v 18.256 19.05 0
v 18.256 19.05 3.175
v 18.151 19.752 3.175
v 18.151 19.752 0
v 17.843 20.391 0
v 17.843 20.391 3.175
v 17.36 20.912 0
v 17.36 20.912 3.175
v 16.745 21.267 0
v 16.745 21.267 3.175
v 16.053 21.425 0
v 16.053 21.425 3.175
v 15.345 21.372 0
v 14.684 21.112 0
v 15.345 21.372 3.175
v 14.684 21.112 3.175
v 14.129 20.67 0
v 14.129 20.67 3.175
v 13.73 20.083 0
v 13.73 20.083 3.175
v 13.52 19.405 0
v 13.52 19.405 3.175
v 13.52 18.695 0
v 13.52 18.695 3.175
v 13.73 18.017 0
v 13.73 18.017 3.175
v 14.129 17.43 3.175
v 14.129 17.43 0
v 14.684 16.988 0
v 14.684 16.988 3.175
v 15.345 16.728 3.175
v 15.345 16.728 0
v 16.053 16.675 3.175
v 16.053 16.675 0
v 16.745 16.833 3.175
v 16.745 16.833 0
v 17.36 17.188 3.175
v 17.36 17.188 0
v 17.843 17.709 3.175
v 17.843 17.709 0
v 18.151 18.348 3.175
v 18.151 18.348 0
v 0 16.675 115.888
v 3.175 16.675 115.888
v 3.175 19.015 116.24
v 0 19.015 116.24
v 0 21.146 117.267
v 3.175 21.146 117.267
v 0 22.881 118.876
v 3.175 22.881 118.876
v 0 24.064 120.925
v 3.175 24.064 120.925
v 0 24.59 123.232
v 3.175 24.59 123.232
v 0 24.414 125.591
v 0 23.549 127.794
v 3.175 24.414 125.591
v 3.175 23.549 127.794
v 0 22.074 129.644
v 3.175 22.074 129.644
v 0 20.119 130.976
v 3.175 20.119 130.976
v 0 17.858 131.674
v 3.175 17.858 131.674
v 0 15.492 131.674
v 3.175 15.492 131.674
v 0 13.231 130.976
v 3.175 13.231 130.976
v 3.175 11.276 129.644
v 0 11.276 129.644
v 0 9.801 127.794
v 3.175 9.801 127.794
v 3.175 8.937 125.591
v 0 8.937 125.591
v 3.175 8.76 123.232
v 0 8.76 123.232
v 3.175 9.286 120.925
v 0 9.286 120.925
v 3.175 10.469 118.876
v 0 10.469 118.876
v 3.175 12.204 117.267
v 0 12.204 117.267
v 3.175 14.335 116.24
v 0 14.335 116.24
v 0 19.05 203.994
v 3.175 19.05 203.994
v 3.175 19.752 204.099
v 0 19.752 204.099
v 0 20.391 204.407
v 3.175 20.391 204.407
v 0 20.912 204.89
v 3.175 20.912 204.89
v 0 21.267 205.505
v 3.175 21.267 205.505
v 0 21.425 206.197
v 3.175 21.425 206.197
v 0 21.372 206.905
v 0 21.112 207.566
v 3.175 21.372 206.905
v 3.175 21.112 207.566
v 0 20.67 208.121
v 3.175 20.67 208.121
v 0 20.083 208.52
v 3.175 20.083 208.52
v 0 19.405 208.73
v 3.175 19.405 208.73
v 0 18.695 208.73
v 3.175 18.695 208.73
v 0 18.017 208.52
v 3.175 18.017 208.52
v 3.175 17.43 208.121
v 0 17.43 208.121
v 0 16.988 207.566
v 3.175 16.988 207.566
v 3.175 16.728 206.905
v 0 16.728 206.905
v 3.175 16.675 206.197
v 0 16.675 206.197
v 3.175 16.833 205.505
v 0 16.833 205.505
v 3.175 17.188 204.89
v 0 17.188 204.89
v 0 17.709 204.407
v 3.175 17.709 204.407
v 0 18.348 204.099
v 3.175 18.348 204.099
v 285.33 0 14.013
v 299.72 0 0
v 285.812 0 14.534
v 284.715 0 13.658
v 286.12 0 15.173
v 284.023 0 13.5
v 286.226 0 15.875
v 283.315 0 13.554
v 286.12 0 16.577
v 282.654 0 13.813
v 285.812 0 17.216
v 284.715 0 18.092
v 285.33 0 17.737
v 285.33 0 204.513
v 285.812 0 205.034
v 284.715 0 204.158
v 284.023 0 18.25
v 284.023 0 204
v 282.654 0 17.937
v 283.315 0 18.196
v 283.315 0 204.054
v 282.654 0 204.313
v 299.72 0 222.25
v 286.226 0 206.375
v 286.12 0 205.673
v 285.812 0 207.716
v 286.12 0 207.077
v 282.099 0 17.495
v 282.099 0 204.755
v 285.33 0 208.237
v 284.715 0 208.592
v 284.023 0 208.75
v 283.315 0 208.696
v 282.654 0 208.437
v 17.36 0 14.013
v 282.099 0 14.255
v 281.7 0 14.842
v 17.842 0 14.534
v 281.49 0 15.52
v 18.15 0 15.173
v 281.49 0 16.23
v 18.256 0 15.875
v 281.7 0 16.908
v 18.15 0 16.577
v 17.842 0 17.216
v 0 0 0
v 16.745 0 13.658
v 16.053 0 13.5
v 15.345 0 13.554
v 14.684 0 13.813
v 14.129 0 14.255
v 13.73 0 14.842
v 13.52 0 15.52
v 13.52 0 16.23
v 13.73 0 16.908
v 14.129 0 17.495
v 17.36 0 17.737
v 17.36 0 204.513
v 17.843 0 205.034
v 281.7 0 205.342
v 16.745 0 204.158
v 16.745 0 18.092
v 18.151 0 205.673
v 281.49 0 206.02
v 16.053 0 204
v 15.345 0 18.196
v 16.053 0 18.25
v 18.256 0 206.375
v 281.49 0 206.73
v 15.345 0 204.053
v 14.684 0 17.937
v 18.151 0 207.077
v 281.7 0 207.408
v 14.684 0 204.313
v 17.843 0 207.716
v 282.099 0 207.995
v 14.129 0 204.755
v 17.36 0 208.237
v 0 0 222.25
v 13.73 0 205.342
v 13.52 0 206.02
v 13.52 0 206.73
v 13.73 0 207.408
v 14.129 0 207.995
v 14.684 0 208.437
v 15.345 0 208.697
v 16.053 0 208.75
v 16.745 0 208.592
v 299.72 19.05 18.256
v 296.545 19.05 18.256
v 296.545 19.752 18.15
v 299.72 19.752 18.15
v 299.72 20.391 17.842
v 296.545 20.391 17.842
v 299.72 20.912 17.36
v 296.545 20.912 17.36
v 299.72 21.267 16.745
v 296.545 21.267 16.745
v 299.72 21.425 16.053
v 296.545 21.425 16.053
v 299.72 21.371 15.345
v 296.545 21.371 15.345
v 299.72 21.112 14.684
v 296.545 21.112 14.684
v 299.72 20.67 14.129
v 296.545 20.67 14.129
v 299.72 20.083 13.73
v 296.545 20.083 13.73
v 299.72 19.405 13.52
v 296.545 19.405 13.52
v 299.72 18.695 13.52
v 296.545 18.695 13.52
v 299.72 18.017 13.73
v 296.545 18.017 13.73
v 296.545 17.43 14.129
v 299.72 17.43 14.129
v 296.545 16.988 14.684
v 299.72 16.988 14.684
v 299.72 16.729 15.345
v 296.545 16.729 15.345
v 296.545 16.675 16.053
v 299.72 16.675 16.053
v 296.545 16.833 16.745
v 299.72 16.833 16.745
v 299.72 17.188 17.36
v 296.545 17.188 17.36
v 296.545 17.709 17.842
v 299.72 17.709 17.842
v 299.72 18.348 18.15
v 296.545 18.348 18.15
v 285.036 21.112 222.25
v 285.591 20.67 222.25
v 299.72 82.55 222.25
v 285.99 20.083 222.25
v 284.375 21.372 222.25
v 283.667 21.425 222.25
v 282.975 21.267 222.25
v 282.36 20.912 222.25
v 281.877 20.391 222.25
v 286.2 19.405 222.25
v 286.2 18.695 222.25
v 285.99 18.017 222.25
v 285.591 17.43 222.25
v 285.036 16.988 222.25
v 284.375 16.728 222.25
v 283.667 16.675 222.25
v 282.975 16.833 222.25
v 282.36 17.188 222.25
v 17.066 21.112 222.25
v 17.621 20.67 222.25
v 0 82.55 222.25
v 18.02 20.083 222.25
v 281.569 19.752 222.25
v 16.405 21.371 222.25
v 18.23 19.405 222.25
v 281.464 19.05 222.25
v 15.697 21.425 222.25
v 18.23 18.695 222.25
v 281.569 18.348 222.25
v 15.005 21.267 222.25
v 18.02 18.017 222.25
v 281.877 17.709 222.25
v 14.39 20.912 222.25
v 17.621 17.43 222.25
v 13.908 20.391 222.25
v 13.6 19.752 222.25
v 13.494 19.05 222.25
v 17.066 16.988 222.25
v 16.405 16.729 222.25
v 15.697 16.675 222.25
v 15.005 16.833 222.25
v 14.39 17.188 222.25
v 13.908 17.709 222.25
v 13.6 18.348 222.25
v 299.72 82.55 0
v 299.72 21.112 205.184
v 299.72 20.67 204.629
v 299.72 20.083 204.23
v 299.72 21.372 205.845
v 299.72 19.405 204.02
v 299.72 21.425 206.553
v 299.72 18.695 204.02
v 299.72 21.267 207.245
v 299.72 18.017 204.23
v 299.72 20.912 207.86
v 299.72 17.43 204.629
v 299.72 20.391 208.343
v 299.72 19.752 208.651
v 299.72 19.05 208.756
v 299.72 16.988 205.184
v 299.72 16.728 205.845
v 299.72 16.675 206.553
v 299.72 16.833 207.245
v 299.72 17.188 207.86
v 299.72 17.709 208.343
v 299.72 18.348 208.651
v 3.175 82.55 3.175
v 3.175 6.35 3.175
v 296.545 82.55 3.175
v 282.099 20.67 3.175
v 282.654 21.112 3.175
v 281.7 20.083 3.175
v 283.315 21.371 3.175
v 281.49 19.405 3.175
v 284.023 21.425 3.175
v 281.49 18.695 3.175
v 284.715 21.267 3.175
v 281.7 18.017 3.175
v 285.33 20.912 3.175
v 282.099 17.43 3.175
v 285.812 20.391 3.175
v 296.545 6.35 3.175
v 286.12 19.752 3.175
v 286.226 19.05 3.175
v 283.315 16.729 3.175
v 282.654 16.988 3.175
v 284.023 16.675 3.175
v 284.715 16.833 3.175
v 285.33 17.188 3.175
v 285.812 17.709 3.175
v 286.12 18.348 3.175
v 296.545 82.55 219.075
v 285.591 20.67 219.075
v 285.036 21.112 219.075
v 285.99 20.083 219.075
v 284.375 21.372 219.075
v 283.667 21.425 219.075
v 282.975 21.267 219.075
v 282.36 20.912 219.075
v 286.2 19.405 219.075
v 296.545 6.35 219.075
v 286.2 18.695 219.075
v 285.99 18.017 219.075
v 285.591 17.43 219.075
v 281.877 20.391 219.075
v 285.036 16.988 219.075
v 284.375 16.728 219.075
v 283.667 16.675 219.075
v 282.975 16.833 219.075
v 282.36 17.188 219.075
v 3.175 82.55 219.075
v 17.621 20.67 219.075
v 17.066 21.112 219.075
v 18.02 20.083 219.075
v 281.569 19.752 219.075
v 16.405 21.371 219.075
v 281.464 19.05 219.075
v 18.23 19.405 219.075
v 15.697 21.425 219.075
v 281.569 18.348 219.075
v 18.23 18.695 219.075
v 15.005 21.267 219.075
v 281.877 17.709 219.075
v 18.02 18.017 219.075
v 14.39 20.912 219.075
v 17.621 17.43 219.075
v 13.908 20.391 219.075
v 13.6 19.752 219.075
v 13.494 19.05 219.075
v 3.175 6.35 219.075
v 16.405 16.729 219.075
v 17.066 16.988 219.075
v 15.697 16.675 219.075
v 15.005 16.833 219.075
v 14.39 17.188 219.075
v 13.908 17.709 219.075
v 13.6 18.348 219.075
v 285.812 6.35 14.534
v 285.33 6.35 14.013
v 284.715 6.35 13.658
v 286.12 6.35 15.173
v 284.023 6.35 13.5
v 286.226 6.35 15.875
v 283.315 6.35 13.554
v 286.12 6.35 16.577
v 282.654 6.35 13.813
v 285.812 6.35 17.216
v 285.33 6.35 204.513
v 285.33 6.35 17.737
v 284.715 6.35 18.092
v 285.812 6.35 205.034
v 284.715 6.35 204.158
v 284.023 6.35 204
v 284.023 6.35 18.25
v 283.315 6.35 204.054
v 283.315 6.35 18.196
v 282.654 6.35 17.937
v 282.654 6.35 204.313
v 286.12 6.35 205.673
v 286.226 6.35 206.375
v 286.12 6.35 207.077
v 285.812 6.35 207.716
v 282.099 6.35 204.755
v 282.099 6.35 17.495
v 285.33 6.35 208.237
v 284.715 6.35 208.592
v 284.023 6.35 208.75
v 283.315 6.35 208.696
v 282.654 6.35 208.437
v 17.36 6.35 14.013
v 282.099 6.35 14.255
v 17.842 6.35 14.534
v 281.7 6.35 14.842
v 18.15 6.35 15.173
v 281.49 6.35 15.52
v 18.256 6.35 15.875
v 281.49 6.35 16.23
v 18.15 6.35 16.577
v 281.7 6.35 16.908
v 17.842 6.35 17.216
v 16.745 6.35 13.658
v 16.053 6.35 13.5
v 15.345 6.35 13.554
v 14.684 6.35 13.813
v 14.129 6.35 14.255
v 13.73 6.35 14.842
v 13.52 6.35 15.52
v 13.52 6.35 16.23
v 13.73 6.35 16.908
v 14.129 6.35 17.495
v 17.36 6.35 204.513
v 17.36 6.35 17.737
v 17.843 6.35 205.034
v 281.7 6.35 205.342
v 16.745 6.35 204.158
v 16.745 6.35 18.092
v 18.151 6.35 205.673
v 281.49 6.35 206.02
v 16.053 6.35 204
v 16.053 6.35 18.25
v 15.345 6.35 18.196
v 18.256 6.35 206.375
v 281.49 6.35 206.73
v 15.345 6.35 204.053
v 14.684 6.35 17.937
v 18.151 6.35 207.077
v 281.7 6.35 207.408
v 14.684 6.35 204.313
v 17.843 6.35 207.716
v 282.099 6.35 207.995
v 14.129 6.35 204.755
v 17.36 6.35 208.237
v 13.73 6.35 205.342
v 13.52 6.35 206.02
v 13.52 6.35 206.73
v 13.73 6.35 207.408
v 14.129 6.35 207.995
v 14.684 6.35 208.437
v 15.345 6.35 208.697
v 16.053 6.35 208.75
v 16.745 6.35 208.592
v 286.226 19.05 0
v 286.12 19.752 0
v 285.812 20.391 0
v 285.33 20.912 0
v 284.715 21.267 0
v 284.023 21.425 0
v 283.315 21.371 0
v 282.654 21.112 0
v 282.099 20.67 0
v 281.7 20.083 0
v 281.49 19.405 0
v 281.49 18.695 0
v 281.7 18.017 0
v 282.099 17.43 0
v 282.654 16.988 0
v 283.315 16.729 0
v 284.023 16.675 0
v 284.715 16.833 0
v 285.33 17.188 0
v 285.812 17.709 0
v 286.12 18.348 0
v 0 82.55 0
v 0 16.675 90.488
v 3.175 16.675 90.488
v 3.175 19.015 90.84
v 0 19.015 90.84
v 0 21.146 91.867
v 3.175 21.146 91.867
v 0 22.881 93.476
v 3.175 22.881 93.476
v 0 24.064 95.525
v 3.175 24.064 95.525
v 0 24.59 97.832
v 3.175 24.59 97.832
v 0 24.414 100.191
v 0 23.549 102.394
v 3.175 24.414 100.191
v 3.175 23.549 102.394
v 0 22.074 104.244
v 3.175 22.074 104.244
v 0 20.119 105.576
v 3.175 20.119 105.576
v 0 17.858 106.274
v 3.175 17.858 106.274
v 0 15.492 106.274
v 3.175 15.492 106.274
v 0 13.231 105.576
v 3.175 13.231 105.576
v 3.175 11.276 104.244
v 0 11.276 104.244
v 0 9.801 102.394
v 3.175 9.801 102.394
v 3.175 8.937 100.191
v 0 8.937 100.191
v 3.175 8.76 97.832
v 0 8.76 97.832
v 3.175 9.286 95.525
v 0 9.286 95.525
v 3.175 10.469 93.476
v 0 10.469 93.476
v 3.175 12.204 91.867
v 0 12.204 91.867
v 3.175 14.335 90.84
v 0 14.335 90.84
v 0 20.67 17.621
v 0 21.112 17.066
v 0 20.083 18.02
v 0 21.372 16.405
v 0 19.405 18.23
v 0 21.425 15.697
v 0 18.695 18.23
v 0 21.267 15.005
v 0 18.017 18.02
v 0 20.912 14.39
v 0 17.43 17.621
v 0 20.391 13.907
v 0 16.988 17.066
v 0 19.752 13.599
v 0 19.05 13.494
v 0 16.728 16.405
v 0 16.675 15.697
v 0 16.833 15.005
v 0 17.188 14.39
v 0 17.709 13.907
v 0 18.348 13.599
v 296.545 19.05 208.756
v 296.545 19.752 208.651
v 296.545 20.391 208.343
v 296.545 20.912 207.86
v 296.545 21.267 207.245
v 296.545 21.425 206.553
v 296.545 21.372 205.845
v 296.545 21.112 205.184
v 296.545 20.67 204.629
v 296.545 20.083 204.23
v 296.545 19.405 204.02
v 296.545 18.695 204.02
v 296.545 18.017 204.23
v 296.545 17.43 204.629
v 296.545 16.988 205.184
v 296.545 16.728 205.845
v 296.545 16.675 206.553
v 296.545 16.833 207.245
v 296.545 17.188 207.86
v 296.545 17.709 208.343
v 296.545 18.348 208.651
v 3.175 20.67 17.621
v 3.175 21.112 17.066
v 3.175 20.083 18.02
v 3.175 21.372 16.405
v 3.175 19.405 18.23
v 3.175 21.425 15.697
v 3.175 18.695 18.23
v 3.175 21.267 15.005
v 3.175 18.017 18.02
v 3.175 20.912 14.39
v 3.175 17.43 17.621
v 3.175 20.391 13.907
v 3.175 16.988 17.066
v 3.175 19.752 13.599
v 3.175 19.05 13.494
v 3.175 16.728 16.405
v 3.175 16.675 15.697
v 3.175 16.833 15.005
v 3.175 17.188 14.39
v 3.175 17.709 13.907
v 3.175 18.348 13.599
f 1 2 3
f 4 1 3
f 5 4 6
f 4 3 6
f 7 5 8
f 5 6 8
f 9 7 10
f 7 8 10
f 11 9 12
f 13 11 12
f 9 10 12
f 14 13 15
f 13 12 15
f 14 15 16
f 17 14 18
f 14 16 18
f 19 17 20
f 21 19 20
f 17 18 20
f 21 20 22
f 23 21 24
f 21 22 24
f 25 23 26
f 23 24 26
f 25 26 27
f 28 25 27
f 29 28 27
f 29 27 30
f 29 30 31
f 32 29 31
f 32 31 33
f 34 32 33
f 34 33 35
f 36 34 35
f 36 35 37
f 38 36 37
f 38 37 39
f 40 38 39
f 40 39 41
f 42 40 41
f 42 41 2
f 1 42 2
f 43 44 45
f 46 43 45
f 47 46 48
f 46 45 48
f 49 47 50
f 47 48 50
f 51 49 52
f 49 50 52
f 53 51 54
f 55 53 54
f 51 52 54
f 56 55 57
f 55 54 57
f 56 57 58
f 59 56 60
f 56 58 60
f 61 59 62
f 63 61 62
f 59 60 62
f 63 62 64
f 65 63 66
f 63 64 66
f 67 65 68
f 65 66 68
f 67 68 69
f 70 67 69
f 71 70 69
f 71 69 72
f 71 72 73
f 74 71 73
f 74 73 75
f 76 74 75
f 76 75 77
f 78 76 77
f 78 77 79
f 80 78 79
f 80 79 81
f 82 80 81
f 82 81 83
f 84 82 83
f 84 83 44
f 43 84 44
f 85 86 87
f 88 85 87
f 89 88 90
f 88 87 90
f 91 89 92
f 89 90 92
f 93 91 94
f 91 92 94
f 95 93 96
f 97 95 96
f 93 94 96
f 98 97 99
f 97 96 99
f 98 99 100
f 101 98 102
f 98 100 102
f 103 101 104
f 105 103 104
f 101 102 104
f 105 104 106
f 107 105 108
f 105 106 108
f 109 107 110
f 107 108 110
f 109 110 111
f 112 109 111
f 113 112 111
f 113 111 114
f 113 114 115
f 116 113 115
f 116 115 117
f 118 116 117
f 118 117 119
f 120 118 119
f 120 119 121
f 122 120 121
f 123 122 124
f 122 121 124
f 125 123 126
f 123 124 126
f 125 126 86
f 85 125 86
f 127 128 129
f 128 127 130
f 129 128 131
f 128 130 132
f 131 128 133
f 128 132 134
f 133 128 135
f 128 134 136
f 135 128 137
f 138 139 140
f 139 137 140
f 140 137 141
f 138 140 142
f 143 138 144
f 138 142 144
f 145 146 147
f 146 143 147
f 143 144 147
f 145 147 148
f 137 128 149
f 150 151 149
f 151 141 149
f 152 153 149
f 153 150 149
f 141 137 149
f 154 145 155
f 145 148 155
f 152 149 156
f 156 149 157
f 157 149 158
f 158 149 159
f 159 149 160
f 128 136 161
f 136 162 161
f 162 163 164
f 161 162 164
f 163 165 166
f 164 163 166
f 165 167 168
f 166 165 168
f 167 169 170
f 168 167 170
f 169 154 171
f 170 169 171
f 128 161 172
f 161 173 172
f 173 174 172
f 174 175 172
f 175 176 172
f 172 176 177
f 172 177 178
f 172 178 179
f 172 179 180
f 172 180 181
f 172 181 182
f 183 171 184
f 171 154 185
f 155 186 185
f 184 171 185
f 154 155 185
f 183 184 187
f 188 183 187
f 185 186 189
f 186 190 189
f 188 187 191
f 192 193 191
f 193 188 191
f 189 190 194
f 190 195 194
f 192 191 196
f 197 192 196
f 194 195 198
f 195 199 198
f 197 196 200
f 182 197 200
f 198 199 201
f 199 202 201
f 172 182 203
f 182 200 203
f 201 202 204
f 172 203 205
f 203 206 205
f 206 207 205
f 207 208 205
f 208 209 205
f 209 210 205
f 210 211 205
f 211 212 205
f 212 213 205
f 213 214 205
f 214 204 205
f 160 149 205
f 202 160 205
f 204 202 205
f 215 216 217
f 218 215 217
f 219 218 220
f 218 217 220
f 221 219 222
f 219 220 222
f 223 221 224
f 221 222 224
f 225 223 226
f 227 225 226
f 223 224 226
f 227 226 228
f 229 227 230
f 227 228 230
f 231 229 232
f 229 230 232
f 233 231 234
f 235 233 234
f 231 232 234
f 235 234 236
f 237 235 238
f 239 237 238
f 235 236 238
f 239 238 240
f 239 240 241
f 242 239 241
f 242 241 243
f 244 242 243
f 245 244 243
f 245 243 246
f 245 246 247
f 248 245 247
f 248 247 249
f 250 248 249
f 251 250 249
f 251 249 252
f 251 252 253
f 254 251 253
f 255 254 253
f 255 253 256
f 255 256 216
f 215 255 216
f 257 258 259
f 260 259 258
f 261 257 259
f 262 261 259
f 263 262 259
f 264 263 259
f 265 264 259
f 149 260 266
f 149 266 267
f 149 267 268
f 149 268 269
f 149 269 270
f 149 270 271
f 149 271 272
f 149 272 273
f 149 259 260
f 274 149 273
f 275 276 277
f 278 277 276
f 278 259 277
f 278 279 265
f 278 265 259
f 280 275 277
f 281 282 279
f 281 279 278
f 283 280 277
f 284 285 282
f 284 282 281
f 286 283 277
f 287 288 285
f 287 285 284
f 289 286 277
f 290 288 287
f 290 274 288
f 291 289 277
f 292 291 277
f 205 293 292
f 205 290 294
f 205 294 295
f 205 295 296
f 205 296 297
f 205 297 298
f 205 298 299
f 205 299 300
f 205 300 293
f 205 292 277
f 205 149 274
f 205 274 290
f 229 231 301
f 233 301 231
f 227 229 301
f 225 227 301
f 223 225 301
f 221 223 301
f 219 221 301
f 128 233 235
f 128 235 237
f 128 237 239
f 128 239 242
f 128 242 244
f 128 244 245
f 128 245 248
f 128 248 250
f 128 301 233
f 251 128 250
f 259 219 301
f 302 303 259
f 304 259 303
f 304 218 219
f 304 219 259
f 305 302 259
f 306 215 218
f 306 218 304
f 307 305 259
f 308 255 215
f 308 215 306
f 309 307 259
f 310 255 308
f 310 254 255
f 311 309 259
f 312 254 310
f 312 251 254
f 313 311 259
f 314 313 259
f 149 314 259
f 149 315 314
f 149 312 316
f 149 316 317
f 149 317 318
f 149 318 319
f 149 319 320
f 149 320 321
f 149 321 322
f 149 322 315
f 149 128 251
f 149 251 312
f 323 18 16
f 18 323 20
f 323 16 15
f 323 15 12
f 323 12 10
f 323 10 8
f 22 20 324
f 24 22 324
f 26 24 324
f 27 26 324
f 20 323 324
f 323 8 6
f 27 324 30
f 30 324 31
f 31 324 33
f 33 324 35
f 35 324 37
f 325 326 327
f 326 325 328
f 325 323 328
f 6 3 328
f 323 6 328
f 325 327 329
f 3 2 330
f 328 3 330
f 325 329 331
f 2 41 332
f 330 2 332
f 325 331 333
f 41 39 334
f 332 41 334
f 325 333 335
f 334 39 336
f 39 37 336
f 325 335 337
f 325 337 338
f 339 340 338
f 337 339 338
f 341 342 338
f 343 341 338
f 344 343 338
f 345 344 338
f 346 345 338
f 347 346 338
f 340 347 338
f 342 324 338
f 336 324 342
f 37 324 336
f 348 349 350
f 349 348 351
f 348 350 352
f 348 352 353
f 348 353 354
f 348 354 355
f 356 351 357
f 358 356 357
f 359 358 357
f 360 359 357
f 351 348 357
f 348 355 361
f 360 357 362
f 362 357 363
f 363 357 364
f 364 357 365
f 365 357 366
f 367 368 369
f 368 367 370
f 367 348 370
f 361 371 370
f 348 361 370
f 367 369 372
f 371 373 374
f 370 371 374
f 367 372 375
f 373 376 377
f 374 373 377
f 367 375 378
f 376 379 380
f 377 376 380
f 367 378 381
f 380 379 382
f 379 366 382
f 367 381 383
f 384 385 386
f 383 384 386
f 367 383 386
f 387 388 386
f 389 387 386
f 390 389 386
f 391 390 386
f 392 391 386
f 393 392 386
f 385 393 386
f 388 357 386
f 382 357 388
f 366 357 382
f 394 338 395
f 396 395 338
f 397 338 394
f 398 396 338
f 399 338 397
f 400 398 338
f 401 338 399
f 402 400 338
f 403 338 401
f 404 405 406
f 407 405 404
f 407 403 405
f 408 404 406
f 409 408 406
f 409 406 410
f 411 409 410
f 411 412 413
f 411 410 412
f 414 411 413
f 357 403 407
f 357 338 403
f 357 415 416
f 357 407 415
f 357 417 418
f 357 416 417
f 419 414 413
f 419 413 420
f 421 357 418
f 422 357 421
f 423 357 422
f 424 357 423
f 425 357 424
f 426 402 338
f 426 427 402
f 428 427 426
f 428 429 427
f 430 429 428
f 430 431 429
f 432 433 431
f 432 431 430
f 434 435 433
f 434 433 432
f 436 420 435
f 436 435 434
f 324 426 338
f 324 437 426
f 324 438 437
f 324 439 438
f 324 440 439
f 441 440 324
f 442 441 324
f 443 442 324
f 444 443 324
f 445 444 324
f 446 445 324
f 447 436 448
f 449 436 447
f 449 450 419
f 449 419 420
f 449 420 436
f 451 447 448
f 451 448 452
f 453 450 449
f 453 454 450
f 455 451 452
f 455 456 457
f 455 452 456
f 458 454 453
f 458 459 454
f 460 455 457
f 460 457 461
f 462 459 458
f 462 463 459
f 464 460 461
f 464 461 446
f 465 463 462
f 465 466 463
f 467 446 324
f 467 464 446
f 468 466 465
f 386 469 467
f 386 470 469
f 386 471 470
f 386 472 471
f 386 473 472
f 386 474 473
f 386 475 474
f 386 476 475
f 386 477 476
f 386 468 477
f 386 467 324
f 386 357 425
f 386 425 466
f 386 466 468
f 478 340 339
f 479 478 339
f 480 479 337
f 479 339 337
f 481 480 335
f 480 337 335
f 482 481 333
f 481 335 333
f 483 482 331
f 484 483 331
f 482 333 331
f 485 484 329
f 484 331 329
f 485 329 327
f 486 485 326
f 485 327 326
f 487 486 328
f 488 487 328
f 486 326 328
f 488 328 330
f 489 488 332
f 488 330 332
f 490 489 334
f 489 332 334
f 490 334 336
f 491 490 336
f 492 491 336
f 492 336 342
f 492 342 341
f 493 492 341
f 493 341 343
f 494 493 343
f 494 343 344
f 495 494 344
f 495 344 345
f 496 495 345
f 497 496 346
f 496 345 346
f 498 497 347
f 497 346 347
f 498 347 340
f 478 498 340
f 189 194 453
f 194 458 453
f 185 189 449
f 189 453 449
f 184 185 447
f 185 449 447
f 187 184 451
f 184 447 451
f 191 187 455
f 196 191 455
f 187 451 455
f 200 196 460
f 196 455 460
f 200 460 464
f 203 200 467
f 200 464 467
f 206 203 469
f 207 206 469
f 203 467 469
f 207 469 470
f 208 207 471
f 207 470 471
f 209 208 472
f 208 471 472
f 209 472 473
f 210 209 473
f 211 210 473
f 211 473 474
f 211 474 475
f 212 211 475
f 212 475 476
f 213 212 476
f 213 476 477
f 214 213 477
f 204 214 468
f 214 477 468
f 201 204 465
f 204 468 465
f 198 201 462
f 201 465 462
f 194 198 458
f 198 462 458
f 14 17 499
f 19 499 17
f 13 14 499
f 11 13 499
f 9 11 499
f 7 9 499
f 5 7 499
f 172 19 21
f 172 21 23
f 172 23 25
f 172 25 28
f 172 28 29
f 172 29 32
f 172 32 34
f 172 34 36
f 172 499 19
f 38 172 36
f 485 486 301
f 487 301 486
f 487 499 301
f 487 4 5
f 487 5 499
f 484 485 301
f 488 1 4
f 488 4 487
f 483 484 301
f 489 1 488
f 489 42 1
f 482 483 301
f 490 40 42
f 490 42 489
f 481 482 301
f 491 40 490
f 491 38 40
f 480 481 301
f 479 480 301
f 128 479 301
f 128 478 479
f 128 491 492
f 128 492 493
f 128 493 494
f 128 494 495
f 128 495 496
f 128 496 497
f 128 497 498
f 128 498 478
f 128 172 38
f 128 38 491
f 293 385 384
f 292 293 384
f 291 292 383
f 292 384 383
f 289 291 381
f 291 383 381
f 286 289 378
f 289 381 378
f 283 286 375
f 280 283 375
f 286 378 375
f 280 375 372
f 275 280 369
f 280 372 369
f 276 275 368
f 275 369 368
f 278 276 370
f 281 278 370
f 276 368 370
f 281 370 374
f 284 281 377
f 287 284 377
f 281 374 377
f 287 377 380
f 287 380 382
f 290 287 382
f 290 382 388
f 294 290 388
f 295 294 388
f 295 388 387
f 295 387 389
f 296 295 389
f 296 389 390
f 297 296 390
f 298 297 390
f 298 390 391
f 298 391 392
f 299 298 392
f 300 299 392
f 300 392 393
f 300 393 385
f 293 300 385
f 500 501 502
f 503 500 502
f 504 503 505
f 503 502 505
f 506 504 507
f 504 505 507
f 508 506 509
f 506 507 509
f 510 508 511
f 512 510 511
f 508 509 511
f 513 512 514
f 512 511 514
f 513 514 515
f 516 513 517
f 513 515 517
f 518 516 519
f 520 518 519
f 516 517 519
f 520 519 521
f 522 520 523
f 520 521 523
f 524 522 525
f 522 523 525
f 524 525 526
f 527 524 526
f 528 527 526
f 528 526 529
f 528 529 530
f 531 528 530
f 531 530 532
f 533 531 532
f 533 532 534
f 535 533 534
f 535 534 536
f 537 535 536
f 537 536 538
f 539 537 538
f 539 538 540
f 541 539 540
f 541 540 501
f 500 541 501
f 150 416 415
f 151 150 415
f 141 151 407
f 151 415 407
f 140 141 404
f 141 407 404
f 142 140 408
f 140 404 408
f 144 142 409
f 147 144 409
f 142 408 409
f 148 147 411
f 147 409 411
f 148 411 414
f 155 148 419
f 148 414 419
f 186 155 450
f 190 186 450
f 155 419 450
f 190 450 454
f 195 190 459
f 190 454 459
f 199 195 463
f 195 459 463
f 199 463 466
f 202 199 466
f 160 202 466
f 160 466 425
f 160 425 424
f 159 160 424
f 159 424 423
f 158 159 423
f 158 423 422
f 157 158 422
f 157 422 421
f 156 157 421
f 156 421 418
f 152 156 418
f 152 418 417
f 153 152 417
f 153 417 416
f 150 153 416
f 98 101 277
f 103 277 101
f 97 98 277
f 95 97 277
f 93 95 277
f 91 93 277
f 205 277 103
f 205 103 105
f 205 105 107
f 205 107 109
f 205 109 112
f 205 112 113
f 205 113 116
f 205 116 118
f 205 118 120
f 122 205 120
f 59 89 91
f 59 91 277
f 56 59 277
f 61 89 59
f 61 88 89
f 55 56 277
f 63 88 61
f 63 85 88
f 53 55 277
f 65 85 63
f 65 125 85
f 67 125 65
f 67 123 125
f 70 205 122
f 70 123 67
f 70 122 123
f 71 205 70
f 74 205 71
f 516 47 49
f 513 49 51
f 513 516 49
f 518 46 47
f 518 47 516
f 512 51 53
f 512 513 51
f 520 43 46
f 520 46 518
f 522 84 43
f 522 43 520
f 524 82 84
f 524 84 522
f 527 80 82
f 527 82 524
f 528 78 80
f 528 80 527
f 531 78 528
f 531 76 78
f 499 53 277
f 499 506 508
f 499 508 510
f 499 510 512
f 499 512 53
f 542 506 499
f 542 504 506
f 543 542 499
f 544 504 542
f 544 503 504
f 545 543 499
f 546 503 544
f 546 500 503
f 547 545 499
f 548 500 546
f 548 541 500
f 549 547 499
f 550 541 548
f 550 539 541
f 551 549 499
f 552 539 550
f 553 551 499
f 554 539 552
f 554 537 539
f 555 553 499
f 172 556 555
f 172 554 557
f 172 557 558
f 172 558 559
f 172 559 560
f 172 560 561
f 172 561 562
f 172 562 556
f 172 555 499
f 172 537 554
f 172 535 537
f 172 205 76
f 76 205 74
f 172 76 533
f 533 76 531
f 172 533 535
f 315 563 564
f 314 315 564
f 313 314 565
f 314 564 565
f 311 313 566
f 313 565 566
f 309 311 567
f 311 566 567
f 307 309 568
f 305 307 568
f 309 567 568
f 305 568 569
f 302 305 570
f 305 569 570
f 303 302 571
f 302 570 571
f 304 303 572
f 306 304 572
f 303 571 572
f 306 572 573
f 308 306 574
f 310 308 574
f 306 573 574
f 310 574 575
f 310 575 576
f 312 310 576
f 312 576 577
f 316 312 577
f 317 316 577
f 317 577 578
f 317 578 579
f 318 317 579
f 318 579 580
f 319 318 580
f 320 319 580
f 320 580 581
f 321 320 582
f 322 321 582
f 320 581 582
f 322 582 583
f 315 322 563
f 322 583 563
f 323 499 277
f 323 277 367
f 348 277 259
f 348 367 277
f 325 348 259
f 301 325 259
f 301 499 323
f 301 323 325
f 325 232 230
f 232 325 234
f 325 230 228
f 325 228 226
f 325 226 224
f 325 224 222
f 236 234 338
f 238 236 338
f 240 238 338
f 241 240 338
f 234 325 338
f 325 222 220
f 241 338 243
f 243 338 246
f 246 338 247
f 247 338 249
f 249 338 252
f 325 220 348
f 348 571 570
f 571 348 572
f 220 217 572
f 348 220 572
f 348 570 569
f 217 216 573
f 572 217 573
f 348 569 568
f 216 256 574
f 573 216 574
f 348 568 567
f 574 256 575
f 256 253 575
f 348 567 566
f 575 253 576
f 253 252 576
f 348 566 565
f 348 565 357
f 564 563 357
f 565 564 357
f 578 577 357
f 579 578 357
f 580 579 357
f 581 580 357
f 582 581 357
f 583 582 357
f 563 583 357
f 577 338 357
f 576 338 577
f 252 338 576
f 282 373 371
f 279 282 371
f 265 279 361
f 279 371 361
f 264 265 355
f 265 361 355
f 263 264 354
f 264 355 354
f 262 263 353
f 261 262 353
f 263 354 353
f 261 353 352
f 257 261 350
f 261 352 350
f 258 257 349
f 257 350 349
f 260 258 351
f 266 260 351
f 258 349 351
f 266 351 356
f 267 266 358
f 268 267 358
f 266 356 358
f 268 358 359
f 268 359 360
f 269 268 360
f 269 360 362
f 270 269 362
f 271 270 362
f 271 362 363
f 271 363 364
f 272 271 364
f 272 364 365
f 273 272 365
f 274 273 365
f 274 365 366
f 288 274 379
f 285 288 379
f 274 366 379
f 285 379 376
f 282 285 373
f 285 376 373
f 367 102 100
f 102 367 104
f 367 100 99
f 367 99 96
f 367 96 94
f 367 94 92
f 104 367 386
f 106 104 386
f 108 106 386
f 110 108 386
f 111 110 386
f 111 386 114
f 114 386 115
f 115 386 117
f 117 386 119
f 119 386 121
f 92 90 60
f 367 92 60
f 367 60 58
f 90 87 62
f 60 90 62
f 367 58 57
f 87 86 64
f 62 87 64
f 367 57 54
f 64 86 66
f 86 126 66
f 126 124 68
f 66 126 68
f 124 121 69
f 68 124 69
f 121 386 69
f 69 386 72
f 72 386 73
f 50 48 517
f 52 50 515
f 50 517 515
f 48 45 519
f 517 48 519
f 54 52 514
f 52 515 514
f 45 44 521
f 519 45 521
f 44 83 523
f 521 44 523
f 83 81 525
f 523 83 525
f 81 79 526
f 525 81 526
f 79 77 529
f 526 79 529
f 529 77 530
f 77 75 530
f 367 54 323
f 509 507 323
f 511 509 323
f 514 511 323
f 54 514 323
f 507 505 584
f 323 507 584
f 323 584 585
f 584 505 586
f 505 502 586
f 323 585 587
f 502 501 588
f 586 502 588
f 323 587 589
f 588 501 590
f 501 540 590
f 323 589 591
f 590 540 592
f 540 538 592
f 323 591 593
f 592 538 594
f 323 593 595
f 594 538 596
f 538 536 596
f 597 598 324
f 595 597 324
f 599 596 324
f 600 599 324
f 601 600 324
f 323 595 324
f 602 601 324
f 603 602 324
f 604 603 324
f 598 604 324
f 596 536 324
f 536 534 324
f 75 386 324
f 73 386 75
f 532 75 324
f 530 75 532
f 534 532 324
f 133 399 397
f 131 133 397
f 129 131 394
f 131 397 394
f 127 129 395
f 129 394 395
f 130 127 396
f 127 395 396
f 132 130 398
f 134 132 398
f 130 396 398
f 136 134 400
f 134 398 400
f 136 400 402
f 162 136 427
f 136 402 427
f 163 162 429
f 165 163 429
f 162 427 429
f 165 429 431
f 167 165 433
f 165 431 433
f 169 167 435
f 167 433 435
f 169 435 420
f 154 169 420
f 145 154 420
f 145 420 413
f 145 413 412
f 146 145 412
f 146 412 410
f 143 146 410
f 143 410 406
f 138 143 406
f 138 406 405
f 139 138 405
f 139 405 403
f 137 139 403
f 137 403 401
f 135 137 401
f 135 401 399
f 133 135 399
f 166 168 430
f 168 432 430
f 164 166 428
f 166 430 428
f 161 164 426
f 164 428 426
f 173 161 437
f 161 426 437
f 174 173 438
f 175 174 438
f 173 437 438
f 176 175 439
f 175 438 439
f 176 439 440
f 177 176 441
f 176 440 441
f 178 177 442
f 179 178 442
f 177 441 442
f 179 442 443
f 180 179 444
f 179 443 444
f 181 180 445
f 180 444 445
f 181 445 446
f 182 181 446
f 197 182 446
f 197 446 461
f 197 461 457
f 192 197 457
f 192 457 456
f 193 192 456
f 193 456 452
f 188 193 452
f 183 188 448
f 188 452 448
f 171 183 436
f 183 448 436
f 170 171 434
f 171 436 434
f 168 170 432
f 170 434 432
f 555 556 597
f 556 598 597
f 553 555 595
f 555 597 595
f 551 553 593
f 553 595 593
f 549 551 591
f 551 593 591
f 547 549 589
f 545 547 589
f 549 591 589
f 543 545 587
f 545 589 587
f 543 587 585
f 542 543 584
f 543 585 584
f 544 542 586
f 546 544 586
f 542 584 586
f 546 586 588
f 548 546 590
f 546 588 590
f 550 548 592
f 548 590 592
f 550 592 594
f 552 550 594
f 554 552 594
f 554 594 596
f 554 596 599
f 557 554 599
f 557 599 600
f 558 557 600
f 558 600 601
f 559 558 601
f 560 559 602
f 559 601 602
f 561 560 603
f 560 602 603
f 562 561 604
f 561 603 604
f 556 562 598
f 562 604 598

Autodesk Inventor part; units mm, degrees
ref_plane "YZ Plane" through (0, 0, 0) normal (1, 0, 0) x (0, 1, 0)
ref_plane "XZ Plane" through (0, 0, 0) normal (0, 1, 0) x (-1, 0, 0)
ref_plane "XY Plane" through (0, 0, 0) normal (0, 0, 1) x (1, 0, 0)
sketch "Sketch1" plane through (0, 0, 0) normal (0, 1, 0) x (-1, 0, 0)
  line L0 (0, 0) -> (-299.72, 0)
  line L1 (-299.72, 0) -> (-299.72, 222.25)
  line L2 (-299.72, 222.25) -> (0, 222.25)
  line L3 (0, 222.25) -> (0, 0)
  dimension "d0" = 299.72
  dimension "d1" = 222.25
extrude "Extrusion1" add sketch "Sketch1" along normal blind 6.35
sketch "Sketch2" plane through (0, 6.35, 0) normal (0, 1, 0) x (1, 0, 0)
  line L0 (0, 0) -> (0, -222.25) projected
  line L1 (299.72, -222.25) -> (299.72, 0) projected
  line L2 (0, -222.25) -> (299.72, -222.25)
  line L3 (299.72, -222.25) -> (299.72, 0)
  line L4 (299.72, 0) -> (0, 0)
  line L5 (0, 0) -> (0, -222.25)
  line L6 (296.545, -219.075) -> (3.175, -219.075)
  line L7 (3.175, -219.075) -> (3.175, -3.175)
  line L8 (3.175, -3.175) -> (296.545, -3.175)
  line L9 (296.545, -3.175) -> (296.545, -219.075)
  point P0 (299.72, -222.25)
  dimension "d4" = 3.175
extrude "Extrusion2" add sketch "Sketch2" along normal blind 76.2
sketch "Sketch3" plane through (0, 6.35, 0) normal (0, 1, 0) x (1, 0, 0)
  line L0 (3.175, -219.075) -> (3.175, -3.175) construction
  line L1 (3.175, -3.175) -> (28.575, -3.175) construction
  line L2 (28.575, -3.175) -> (28.575, -28.575) construction
  line L3 (28.575, -28.575) -> (3.175, -28.575) construction
  line L4 (3.175, -28.575) -> (3.175, -3.175) construction
  line L5 (296.545, -3.175) -> (271.145, -3.175) construction
  line L6 (271.145, -3.175) -> (271.145, -28.575) construction
  line L7 (271.145, -28.575) -> (296.545, -28.575) construction
  line L8 (296.545, -28.575) -> (296.545, -3.175) construction
  line L9 (296.545, -219.075) -> (3.175, -219.075) construction
  line L10 (296.545, -219.075) -> (271.145, -219.075) construction
  line L11 (271.145, -219.075) -> (271.145, -193.675) construction
  line L12 (271.145, -193.675) -> (296.545, -193.675) construction
  line L13 (296.545, -193.675) -> (296.545, -219.075) construction
  line L14 (3.175, -219.075) -> (28.575, -219.075) construction
  line L15 (28.575, -219.075) -> (28.575, -193.675) construction
  line L16 (28.575, -193.675) -> (3.175, -193.675) construction
  line L17 (3.175, -193.675) -> (3.175, -219.075) construction
  line L18 (3.175, -193.675) -> (28.575, -219.075) construction
  line L19 (28.575, -193.675) -> (3.175, -219.075) construction
  line L20 (271.145, -193.675) -> (296.545, -219.075) construction
  line L21 (296.545, -219.075) -> (296.545, -193.675) construction
  line L22 (296.545, -193.675) -> (271.145, -219.075) construction
  line L23 (271.145, -3.175) -> (296.545, -28.575) construction
  line L24 (296.545, -3.175) -> (271.145, -28.575) construction
  line L25 (3.175, -3.175) -> (28.575, -28.575) construction
  line L26 (28.575, -3.175) -> (3.175, -28.575) construction
  circle A0 centre (15.875, -15.875) radius 2.3812
  circle A1 centre (283.845, -15.875) radius 2.3812
  circle A2 centre (283.845, -206.375) radius 2.3812
  circle A3 centre (15.875, -206.375) radius 2.3813
  point P0 (0, 0)
  dimension "d7" = 25.4
  dimension "d8" = 25.4
  dimension "d9" = 25.4
  dimension "d10" = 25.4
  dimension "d11" = 25.4
  dimension "d12" = 25.4
  dimension "d13" = 25.4
  dimension "d14" = 25.4
  dimension "d15" = 4.7625
  dimension "d16" = 4.7625
  dimension "d17" = 4.7625
  dimension "d18" = 4.7625
extrude "Extrusion3" cut sketch "Sketch3" against normal blind 6.35
sketch "Sketch4" plane through (3.175, 6.35, 219.075) normal (1, 0, 0) x (0, 0, -1)
  line L0 (215.9, 0) -> (0, 0) construction
  line L1 (0, 0) -> (25.4, 0) construction
  line L2 (25.4, 0) -> (25.4, 25.4) construction
  line L3 (25.4, 25.4) -> (0, 25.4) construction
  line L4 (0, 25.4) -> (0, 0) construction
  line L5 (215.9, 0) -> (190.5, 0) construction
  line L6 (190.5, 0) -> (190.5, 25.4) construction
  line L7 (190.5, 25.4) -> (215.9, 25.4) construction
  line L8 (215.9, 25.4) -> (215.9, 0) construction
  line L9 (0, 25.4) -> (25.4, 0) construction
  line L10 (25.4, 25.4) -> (0, 0) construction
  line L11 (190.5, 25.4) -> (215.9, 0) construction
  line L12 (215.9, 25.4) -> (190.5, 0) construction
  circle A0 centre (203.2, 12.7) radius 2.3813
  circle A1 centre (12.7, 12.7) radius 2.3813
  point P0 (219.075, -6.35)
  dimension "d21" = 25.4
  dimension "d22" = 25.4
  dimension "d23" = 25.4
  dimension "d24" = 25.4
  dimension "d25" = 4.7625
  dimension "d26" = 4.7625
extrude "Extrusion4" cut sketch "Sketch4" against normal blind 3.175
sketch "Sketch5" plane through (3.175, 6.35, 3.175) normal (0, 0, 1) x (1, 0, 0)
  line L0 (0, 0) -> (0, 76.2) construction
  line L1 (0, 0) -> (25.4, 0) construction
  line L2 (25.4, 0) -> (25.4, 25.4) construction
  line L3 (25.4, 25.4) -> (0, 25.4) construction
  line L4 (0, 25.4) -> (0, 0) construction
  line L5 (293.37, 0) -> (267.97, 0) construction
  line L6 (267.97, 0) -> (267.97, 25.4) construction
  line L7 (267.97, 25.4) -> (293.37, 25.4) construction
  line L8 (293.37, 25.4) -> (293.37, 0) construction
  line L9 (0, 25.4) -> (25.4, 0) construction
  line L10 (293.37, 0) -> (0, 0) construction
  line L11 (25.4, 25.4) -> (0, 0) construction
  line L12 (293.37, 25.4) -> (267.97, 0) construction
  line L13 (293.37, 0) -> (293.37, 76.2) construction
  line L14 (267.97, 25.4) -> (293.37, 0) construction
  circle A0 centre (280.67, 12.7) radius 2.3812
  circle A1 centre (12.7, 12.7) radius 2.3813
  point P0 (-3.175, -6.35)
  dimension "d29" = 25.4
  dimension "d30" = 25.4
  dimension "d31" = 25.4
  dimension "d32" = 25.4
  dimension "d33" = 4.7625
  dimension "d34" = 4.7625
extrude "Extrusion5" cut sketch "Sketch5" against normal blind 3.175
sketch "Sketch6" plane through (296.545, 6.35, 3.175) normal (-1, 0, 0) x (0, 0, 1)
  line L0 (215.9, 0) -> (0, 0) construction
  line L1 (0, 0) -> (25.4, 0) construction
  line L2 (25.4, 0) -> (25.4, 25.4) construction
  line L3 (25.4, 25.4) -> (0, 25.4) construction
  line L4 (0, 25.4) -> (0, 0) construction
  line L5 (215.9, 0) -> (190.5, 0) construction
  line L6 (190.5, 0) -> (190.5, 25.4) construction
  line L7 (190.5, 25.4) -> (215.9, 25.4) construction
  line L8 (215.9, 25.4) -> (215.9, 0) construction
  line L9 (190.5, 0) -> (215.9, 25.4) construction
  line L10 (215.9, 0) -> (215.9, 76.2) construction
  line L11 (190.5, 25.4) -> (215.9, 0) construction
  line L12 (0, 25.4) -> (25.4, 0) construction
  line L13 (25.4, 25.4) -> (0, 0) construction
  circle A0 centre (12.7, 12.7) radius 2.3812
  circle A1 centre (203.2, 12.7) radius 2.3813
  point P0 (-3.175, -6.35)
  dimension "d37" = 25.4
  dimension "d38" = 25.4
  dimension "d39" = 25.4
  dimension "d40" = 25.4
  dimension "d41" = 4.7625
  dimension "d42" = 4.7625
extrude "Extrusion6" cut sketch "Sketch6" against normal blind 3.175
sketch "Sketch7" plane through (296.545, 6.35, 219.075) normal (0, 0, -1) x (-1, 0, 0)
  line L0 (293.37, 0) -> (267.97, 0) construction
  line L1 (267.97, 0) -> (267.97, 25.4) construction
  line L2 (267.97, 25.4) -> (293.37, 25.4) construction
  line L3 (293.37, 25.4) -> (293.37, 0) construction
  line L4 (293.37, 0) -> (0, 0) construction
  line L5 (0, 0) -> (25.4, 0) construction
  line L6 (25.4, 0) -> (25.4, 25.4) construction
  line L7 (25.4, 25.4) -> (0, 25.4) construction
  line L8 (0, 25.4) -> (0, 0) construction
  line L9 (0, 25.4) -> (25.4, 0) construction
  line L10 (25.4, 25.4) -> (0, 0) construction
  line L11 (267.97, 0) -> (293.37, 25.4) construction
  line L12 (267.97, 25.4) -> (293.37, 0) construction
  circle A0 centre (280.67, 12.7) radius 2.3812
  circle A1 centre (12.7, 12.7) radius 2.3813
  point P0 (296.545, -6.35)
  dimension "d45" = 25.4
  dimension "d46" = 25.4
  dimension "d47" = 25.4
  dimension "d48" = 25.4
  dimension "d49" = 4.7625
  dimension "d50" = 4.7625
extrude "Extrusion7" cut sketch "Sketch7" against normal blind 3.175
sketch "Sketch8" plane through (3.175, 6.35, 219.075) normal (1, 0, 0) x (0, 0, -1)
  line L0 (215.9, 0) -> (0, 0) construction
  line L1 (0, 0) -> (107.95, 0) construction
  line L2 (107.95, 0) -> (130.175, 0) construction
  line L3 (107.95, 0) -> (130.175, 0) construction
  line L4 (130.175, 0) -> (85.725, 0) construction
  line L5 (85.725, 0) -> (85.725, 20.6375) construction
  line L6 (85.725, 20.6375) -> (130.175, 20.6375) construction
  line L7 (130.175, 20.6375) -> (130.175, 0) construction
  line L8 (85.725, 0) -> (85.725, 10.3251) construction
  line L9 (130.175, 0) -> (130.175, 10.3251) construction
  line L10 (130.175, 0) -> (140.5001, 0) construction
  line L11 (85.725, 10.3251) -> (87.3125, 10.3251) construction
  line L12 (130.175, 10.3251) -> (128.5875, 10.3251) construction
  line L13 (128.5875, 10.3251) -> (120.65, 10.3251) construction
  line L14 (128.5875, 10.3251) -> (136.525, 10.3251) construction
  line L15 (87.3125, 10.3251) -> (95.25, 10.3251) construction
  line L16 (87.3125, 10.3251) -> (95.25, 10.3251) construction
  circle A0 centre (95.25, 10.3251) radius 7.9375
  circle A1 centre (120.65, 10.3251) radius 7.9375
  dimension "d53" = 107.95
  dimension "d54" = 22.225
  dimension "d55" = 0
  dimension "d56" = 44.45
  dimension "d57" = 20.6375
  dimension "d58" = 10.3251
  dimension "d59" = 10.3251
  dimension "d60" = 90
  dimension "d61" = 1.5875
  dimension "d62" = 1.5875
  dimension "d64" = 7.9375
  dimension "d65" = 180
  dimension "d66" = 7.9375
  dimension "d67" = 0
  dimension "d68" = 15.875
  dimension "d69" = 15.875
extrude "Extrusion8" cut sketch "Sketch8" against normal blind 3.175
properties part number "Lower Chassis_2"
